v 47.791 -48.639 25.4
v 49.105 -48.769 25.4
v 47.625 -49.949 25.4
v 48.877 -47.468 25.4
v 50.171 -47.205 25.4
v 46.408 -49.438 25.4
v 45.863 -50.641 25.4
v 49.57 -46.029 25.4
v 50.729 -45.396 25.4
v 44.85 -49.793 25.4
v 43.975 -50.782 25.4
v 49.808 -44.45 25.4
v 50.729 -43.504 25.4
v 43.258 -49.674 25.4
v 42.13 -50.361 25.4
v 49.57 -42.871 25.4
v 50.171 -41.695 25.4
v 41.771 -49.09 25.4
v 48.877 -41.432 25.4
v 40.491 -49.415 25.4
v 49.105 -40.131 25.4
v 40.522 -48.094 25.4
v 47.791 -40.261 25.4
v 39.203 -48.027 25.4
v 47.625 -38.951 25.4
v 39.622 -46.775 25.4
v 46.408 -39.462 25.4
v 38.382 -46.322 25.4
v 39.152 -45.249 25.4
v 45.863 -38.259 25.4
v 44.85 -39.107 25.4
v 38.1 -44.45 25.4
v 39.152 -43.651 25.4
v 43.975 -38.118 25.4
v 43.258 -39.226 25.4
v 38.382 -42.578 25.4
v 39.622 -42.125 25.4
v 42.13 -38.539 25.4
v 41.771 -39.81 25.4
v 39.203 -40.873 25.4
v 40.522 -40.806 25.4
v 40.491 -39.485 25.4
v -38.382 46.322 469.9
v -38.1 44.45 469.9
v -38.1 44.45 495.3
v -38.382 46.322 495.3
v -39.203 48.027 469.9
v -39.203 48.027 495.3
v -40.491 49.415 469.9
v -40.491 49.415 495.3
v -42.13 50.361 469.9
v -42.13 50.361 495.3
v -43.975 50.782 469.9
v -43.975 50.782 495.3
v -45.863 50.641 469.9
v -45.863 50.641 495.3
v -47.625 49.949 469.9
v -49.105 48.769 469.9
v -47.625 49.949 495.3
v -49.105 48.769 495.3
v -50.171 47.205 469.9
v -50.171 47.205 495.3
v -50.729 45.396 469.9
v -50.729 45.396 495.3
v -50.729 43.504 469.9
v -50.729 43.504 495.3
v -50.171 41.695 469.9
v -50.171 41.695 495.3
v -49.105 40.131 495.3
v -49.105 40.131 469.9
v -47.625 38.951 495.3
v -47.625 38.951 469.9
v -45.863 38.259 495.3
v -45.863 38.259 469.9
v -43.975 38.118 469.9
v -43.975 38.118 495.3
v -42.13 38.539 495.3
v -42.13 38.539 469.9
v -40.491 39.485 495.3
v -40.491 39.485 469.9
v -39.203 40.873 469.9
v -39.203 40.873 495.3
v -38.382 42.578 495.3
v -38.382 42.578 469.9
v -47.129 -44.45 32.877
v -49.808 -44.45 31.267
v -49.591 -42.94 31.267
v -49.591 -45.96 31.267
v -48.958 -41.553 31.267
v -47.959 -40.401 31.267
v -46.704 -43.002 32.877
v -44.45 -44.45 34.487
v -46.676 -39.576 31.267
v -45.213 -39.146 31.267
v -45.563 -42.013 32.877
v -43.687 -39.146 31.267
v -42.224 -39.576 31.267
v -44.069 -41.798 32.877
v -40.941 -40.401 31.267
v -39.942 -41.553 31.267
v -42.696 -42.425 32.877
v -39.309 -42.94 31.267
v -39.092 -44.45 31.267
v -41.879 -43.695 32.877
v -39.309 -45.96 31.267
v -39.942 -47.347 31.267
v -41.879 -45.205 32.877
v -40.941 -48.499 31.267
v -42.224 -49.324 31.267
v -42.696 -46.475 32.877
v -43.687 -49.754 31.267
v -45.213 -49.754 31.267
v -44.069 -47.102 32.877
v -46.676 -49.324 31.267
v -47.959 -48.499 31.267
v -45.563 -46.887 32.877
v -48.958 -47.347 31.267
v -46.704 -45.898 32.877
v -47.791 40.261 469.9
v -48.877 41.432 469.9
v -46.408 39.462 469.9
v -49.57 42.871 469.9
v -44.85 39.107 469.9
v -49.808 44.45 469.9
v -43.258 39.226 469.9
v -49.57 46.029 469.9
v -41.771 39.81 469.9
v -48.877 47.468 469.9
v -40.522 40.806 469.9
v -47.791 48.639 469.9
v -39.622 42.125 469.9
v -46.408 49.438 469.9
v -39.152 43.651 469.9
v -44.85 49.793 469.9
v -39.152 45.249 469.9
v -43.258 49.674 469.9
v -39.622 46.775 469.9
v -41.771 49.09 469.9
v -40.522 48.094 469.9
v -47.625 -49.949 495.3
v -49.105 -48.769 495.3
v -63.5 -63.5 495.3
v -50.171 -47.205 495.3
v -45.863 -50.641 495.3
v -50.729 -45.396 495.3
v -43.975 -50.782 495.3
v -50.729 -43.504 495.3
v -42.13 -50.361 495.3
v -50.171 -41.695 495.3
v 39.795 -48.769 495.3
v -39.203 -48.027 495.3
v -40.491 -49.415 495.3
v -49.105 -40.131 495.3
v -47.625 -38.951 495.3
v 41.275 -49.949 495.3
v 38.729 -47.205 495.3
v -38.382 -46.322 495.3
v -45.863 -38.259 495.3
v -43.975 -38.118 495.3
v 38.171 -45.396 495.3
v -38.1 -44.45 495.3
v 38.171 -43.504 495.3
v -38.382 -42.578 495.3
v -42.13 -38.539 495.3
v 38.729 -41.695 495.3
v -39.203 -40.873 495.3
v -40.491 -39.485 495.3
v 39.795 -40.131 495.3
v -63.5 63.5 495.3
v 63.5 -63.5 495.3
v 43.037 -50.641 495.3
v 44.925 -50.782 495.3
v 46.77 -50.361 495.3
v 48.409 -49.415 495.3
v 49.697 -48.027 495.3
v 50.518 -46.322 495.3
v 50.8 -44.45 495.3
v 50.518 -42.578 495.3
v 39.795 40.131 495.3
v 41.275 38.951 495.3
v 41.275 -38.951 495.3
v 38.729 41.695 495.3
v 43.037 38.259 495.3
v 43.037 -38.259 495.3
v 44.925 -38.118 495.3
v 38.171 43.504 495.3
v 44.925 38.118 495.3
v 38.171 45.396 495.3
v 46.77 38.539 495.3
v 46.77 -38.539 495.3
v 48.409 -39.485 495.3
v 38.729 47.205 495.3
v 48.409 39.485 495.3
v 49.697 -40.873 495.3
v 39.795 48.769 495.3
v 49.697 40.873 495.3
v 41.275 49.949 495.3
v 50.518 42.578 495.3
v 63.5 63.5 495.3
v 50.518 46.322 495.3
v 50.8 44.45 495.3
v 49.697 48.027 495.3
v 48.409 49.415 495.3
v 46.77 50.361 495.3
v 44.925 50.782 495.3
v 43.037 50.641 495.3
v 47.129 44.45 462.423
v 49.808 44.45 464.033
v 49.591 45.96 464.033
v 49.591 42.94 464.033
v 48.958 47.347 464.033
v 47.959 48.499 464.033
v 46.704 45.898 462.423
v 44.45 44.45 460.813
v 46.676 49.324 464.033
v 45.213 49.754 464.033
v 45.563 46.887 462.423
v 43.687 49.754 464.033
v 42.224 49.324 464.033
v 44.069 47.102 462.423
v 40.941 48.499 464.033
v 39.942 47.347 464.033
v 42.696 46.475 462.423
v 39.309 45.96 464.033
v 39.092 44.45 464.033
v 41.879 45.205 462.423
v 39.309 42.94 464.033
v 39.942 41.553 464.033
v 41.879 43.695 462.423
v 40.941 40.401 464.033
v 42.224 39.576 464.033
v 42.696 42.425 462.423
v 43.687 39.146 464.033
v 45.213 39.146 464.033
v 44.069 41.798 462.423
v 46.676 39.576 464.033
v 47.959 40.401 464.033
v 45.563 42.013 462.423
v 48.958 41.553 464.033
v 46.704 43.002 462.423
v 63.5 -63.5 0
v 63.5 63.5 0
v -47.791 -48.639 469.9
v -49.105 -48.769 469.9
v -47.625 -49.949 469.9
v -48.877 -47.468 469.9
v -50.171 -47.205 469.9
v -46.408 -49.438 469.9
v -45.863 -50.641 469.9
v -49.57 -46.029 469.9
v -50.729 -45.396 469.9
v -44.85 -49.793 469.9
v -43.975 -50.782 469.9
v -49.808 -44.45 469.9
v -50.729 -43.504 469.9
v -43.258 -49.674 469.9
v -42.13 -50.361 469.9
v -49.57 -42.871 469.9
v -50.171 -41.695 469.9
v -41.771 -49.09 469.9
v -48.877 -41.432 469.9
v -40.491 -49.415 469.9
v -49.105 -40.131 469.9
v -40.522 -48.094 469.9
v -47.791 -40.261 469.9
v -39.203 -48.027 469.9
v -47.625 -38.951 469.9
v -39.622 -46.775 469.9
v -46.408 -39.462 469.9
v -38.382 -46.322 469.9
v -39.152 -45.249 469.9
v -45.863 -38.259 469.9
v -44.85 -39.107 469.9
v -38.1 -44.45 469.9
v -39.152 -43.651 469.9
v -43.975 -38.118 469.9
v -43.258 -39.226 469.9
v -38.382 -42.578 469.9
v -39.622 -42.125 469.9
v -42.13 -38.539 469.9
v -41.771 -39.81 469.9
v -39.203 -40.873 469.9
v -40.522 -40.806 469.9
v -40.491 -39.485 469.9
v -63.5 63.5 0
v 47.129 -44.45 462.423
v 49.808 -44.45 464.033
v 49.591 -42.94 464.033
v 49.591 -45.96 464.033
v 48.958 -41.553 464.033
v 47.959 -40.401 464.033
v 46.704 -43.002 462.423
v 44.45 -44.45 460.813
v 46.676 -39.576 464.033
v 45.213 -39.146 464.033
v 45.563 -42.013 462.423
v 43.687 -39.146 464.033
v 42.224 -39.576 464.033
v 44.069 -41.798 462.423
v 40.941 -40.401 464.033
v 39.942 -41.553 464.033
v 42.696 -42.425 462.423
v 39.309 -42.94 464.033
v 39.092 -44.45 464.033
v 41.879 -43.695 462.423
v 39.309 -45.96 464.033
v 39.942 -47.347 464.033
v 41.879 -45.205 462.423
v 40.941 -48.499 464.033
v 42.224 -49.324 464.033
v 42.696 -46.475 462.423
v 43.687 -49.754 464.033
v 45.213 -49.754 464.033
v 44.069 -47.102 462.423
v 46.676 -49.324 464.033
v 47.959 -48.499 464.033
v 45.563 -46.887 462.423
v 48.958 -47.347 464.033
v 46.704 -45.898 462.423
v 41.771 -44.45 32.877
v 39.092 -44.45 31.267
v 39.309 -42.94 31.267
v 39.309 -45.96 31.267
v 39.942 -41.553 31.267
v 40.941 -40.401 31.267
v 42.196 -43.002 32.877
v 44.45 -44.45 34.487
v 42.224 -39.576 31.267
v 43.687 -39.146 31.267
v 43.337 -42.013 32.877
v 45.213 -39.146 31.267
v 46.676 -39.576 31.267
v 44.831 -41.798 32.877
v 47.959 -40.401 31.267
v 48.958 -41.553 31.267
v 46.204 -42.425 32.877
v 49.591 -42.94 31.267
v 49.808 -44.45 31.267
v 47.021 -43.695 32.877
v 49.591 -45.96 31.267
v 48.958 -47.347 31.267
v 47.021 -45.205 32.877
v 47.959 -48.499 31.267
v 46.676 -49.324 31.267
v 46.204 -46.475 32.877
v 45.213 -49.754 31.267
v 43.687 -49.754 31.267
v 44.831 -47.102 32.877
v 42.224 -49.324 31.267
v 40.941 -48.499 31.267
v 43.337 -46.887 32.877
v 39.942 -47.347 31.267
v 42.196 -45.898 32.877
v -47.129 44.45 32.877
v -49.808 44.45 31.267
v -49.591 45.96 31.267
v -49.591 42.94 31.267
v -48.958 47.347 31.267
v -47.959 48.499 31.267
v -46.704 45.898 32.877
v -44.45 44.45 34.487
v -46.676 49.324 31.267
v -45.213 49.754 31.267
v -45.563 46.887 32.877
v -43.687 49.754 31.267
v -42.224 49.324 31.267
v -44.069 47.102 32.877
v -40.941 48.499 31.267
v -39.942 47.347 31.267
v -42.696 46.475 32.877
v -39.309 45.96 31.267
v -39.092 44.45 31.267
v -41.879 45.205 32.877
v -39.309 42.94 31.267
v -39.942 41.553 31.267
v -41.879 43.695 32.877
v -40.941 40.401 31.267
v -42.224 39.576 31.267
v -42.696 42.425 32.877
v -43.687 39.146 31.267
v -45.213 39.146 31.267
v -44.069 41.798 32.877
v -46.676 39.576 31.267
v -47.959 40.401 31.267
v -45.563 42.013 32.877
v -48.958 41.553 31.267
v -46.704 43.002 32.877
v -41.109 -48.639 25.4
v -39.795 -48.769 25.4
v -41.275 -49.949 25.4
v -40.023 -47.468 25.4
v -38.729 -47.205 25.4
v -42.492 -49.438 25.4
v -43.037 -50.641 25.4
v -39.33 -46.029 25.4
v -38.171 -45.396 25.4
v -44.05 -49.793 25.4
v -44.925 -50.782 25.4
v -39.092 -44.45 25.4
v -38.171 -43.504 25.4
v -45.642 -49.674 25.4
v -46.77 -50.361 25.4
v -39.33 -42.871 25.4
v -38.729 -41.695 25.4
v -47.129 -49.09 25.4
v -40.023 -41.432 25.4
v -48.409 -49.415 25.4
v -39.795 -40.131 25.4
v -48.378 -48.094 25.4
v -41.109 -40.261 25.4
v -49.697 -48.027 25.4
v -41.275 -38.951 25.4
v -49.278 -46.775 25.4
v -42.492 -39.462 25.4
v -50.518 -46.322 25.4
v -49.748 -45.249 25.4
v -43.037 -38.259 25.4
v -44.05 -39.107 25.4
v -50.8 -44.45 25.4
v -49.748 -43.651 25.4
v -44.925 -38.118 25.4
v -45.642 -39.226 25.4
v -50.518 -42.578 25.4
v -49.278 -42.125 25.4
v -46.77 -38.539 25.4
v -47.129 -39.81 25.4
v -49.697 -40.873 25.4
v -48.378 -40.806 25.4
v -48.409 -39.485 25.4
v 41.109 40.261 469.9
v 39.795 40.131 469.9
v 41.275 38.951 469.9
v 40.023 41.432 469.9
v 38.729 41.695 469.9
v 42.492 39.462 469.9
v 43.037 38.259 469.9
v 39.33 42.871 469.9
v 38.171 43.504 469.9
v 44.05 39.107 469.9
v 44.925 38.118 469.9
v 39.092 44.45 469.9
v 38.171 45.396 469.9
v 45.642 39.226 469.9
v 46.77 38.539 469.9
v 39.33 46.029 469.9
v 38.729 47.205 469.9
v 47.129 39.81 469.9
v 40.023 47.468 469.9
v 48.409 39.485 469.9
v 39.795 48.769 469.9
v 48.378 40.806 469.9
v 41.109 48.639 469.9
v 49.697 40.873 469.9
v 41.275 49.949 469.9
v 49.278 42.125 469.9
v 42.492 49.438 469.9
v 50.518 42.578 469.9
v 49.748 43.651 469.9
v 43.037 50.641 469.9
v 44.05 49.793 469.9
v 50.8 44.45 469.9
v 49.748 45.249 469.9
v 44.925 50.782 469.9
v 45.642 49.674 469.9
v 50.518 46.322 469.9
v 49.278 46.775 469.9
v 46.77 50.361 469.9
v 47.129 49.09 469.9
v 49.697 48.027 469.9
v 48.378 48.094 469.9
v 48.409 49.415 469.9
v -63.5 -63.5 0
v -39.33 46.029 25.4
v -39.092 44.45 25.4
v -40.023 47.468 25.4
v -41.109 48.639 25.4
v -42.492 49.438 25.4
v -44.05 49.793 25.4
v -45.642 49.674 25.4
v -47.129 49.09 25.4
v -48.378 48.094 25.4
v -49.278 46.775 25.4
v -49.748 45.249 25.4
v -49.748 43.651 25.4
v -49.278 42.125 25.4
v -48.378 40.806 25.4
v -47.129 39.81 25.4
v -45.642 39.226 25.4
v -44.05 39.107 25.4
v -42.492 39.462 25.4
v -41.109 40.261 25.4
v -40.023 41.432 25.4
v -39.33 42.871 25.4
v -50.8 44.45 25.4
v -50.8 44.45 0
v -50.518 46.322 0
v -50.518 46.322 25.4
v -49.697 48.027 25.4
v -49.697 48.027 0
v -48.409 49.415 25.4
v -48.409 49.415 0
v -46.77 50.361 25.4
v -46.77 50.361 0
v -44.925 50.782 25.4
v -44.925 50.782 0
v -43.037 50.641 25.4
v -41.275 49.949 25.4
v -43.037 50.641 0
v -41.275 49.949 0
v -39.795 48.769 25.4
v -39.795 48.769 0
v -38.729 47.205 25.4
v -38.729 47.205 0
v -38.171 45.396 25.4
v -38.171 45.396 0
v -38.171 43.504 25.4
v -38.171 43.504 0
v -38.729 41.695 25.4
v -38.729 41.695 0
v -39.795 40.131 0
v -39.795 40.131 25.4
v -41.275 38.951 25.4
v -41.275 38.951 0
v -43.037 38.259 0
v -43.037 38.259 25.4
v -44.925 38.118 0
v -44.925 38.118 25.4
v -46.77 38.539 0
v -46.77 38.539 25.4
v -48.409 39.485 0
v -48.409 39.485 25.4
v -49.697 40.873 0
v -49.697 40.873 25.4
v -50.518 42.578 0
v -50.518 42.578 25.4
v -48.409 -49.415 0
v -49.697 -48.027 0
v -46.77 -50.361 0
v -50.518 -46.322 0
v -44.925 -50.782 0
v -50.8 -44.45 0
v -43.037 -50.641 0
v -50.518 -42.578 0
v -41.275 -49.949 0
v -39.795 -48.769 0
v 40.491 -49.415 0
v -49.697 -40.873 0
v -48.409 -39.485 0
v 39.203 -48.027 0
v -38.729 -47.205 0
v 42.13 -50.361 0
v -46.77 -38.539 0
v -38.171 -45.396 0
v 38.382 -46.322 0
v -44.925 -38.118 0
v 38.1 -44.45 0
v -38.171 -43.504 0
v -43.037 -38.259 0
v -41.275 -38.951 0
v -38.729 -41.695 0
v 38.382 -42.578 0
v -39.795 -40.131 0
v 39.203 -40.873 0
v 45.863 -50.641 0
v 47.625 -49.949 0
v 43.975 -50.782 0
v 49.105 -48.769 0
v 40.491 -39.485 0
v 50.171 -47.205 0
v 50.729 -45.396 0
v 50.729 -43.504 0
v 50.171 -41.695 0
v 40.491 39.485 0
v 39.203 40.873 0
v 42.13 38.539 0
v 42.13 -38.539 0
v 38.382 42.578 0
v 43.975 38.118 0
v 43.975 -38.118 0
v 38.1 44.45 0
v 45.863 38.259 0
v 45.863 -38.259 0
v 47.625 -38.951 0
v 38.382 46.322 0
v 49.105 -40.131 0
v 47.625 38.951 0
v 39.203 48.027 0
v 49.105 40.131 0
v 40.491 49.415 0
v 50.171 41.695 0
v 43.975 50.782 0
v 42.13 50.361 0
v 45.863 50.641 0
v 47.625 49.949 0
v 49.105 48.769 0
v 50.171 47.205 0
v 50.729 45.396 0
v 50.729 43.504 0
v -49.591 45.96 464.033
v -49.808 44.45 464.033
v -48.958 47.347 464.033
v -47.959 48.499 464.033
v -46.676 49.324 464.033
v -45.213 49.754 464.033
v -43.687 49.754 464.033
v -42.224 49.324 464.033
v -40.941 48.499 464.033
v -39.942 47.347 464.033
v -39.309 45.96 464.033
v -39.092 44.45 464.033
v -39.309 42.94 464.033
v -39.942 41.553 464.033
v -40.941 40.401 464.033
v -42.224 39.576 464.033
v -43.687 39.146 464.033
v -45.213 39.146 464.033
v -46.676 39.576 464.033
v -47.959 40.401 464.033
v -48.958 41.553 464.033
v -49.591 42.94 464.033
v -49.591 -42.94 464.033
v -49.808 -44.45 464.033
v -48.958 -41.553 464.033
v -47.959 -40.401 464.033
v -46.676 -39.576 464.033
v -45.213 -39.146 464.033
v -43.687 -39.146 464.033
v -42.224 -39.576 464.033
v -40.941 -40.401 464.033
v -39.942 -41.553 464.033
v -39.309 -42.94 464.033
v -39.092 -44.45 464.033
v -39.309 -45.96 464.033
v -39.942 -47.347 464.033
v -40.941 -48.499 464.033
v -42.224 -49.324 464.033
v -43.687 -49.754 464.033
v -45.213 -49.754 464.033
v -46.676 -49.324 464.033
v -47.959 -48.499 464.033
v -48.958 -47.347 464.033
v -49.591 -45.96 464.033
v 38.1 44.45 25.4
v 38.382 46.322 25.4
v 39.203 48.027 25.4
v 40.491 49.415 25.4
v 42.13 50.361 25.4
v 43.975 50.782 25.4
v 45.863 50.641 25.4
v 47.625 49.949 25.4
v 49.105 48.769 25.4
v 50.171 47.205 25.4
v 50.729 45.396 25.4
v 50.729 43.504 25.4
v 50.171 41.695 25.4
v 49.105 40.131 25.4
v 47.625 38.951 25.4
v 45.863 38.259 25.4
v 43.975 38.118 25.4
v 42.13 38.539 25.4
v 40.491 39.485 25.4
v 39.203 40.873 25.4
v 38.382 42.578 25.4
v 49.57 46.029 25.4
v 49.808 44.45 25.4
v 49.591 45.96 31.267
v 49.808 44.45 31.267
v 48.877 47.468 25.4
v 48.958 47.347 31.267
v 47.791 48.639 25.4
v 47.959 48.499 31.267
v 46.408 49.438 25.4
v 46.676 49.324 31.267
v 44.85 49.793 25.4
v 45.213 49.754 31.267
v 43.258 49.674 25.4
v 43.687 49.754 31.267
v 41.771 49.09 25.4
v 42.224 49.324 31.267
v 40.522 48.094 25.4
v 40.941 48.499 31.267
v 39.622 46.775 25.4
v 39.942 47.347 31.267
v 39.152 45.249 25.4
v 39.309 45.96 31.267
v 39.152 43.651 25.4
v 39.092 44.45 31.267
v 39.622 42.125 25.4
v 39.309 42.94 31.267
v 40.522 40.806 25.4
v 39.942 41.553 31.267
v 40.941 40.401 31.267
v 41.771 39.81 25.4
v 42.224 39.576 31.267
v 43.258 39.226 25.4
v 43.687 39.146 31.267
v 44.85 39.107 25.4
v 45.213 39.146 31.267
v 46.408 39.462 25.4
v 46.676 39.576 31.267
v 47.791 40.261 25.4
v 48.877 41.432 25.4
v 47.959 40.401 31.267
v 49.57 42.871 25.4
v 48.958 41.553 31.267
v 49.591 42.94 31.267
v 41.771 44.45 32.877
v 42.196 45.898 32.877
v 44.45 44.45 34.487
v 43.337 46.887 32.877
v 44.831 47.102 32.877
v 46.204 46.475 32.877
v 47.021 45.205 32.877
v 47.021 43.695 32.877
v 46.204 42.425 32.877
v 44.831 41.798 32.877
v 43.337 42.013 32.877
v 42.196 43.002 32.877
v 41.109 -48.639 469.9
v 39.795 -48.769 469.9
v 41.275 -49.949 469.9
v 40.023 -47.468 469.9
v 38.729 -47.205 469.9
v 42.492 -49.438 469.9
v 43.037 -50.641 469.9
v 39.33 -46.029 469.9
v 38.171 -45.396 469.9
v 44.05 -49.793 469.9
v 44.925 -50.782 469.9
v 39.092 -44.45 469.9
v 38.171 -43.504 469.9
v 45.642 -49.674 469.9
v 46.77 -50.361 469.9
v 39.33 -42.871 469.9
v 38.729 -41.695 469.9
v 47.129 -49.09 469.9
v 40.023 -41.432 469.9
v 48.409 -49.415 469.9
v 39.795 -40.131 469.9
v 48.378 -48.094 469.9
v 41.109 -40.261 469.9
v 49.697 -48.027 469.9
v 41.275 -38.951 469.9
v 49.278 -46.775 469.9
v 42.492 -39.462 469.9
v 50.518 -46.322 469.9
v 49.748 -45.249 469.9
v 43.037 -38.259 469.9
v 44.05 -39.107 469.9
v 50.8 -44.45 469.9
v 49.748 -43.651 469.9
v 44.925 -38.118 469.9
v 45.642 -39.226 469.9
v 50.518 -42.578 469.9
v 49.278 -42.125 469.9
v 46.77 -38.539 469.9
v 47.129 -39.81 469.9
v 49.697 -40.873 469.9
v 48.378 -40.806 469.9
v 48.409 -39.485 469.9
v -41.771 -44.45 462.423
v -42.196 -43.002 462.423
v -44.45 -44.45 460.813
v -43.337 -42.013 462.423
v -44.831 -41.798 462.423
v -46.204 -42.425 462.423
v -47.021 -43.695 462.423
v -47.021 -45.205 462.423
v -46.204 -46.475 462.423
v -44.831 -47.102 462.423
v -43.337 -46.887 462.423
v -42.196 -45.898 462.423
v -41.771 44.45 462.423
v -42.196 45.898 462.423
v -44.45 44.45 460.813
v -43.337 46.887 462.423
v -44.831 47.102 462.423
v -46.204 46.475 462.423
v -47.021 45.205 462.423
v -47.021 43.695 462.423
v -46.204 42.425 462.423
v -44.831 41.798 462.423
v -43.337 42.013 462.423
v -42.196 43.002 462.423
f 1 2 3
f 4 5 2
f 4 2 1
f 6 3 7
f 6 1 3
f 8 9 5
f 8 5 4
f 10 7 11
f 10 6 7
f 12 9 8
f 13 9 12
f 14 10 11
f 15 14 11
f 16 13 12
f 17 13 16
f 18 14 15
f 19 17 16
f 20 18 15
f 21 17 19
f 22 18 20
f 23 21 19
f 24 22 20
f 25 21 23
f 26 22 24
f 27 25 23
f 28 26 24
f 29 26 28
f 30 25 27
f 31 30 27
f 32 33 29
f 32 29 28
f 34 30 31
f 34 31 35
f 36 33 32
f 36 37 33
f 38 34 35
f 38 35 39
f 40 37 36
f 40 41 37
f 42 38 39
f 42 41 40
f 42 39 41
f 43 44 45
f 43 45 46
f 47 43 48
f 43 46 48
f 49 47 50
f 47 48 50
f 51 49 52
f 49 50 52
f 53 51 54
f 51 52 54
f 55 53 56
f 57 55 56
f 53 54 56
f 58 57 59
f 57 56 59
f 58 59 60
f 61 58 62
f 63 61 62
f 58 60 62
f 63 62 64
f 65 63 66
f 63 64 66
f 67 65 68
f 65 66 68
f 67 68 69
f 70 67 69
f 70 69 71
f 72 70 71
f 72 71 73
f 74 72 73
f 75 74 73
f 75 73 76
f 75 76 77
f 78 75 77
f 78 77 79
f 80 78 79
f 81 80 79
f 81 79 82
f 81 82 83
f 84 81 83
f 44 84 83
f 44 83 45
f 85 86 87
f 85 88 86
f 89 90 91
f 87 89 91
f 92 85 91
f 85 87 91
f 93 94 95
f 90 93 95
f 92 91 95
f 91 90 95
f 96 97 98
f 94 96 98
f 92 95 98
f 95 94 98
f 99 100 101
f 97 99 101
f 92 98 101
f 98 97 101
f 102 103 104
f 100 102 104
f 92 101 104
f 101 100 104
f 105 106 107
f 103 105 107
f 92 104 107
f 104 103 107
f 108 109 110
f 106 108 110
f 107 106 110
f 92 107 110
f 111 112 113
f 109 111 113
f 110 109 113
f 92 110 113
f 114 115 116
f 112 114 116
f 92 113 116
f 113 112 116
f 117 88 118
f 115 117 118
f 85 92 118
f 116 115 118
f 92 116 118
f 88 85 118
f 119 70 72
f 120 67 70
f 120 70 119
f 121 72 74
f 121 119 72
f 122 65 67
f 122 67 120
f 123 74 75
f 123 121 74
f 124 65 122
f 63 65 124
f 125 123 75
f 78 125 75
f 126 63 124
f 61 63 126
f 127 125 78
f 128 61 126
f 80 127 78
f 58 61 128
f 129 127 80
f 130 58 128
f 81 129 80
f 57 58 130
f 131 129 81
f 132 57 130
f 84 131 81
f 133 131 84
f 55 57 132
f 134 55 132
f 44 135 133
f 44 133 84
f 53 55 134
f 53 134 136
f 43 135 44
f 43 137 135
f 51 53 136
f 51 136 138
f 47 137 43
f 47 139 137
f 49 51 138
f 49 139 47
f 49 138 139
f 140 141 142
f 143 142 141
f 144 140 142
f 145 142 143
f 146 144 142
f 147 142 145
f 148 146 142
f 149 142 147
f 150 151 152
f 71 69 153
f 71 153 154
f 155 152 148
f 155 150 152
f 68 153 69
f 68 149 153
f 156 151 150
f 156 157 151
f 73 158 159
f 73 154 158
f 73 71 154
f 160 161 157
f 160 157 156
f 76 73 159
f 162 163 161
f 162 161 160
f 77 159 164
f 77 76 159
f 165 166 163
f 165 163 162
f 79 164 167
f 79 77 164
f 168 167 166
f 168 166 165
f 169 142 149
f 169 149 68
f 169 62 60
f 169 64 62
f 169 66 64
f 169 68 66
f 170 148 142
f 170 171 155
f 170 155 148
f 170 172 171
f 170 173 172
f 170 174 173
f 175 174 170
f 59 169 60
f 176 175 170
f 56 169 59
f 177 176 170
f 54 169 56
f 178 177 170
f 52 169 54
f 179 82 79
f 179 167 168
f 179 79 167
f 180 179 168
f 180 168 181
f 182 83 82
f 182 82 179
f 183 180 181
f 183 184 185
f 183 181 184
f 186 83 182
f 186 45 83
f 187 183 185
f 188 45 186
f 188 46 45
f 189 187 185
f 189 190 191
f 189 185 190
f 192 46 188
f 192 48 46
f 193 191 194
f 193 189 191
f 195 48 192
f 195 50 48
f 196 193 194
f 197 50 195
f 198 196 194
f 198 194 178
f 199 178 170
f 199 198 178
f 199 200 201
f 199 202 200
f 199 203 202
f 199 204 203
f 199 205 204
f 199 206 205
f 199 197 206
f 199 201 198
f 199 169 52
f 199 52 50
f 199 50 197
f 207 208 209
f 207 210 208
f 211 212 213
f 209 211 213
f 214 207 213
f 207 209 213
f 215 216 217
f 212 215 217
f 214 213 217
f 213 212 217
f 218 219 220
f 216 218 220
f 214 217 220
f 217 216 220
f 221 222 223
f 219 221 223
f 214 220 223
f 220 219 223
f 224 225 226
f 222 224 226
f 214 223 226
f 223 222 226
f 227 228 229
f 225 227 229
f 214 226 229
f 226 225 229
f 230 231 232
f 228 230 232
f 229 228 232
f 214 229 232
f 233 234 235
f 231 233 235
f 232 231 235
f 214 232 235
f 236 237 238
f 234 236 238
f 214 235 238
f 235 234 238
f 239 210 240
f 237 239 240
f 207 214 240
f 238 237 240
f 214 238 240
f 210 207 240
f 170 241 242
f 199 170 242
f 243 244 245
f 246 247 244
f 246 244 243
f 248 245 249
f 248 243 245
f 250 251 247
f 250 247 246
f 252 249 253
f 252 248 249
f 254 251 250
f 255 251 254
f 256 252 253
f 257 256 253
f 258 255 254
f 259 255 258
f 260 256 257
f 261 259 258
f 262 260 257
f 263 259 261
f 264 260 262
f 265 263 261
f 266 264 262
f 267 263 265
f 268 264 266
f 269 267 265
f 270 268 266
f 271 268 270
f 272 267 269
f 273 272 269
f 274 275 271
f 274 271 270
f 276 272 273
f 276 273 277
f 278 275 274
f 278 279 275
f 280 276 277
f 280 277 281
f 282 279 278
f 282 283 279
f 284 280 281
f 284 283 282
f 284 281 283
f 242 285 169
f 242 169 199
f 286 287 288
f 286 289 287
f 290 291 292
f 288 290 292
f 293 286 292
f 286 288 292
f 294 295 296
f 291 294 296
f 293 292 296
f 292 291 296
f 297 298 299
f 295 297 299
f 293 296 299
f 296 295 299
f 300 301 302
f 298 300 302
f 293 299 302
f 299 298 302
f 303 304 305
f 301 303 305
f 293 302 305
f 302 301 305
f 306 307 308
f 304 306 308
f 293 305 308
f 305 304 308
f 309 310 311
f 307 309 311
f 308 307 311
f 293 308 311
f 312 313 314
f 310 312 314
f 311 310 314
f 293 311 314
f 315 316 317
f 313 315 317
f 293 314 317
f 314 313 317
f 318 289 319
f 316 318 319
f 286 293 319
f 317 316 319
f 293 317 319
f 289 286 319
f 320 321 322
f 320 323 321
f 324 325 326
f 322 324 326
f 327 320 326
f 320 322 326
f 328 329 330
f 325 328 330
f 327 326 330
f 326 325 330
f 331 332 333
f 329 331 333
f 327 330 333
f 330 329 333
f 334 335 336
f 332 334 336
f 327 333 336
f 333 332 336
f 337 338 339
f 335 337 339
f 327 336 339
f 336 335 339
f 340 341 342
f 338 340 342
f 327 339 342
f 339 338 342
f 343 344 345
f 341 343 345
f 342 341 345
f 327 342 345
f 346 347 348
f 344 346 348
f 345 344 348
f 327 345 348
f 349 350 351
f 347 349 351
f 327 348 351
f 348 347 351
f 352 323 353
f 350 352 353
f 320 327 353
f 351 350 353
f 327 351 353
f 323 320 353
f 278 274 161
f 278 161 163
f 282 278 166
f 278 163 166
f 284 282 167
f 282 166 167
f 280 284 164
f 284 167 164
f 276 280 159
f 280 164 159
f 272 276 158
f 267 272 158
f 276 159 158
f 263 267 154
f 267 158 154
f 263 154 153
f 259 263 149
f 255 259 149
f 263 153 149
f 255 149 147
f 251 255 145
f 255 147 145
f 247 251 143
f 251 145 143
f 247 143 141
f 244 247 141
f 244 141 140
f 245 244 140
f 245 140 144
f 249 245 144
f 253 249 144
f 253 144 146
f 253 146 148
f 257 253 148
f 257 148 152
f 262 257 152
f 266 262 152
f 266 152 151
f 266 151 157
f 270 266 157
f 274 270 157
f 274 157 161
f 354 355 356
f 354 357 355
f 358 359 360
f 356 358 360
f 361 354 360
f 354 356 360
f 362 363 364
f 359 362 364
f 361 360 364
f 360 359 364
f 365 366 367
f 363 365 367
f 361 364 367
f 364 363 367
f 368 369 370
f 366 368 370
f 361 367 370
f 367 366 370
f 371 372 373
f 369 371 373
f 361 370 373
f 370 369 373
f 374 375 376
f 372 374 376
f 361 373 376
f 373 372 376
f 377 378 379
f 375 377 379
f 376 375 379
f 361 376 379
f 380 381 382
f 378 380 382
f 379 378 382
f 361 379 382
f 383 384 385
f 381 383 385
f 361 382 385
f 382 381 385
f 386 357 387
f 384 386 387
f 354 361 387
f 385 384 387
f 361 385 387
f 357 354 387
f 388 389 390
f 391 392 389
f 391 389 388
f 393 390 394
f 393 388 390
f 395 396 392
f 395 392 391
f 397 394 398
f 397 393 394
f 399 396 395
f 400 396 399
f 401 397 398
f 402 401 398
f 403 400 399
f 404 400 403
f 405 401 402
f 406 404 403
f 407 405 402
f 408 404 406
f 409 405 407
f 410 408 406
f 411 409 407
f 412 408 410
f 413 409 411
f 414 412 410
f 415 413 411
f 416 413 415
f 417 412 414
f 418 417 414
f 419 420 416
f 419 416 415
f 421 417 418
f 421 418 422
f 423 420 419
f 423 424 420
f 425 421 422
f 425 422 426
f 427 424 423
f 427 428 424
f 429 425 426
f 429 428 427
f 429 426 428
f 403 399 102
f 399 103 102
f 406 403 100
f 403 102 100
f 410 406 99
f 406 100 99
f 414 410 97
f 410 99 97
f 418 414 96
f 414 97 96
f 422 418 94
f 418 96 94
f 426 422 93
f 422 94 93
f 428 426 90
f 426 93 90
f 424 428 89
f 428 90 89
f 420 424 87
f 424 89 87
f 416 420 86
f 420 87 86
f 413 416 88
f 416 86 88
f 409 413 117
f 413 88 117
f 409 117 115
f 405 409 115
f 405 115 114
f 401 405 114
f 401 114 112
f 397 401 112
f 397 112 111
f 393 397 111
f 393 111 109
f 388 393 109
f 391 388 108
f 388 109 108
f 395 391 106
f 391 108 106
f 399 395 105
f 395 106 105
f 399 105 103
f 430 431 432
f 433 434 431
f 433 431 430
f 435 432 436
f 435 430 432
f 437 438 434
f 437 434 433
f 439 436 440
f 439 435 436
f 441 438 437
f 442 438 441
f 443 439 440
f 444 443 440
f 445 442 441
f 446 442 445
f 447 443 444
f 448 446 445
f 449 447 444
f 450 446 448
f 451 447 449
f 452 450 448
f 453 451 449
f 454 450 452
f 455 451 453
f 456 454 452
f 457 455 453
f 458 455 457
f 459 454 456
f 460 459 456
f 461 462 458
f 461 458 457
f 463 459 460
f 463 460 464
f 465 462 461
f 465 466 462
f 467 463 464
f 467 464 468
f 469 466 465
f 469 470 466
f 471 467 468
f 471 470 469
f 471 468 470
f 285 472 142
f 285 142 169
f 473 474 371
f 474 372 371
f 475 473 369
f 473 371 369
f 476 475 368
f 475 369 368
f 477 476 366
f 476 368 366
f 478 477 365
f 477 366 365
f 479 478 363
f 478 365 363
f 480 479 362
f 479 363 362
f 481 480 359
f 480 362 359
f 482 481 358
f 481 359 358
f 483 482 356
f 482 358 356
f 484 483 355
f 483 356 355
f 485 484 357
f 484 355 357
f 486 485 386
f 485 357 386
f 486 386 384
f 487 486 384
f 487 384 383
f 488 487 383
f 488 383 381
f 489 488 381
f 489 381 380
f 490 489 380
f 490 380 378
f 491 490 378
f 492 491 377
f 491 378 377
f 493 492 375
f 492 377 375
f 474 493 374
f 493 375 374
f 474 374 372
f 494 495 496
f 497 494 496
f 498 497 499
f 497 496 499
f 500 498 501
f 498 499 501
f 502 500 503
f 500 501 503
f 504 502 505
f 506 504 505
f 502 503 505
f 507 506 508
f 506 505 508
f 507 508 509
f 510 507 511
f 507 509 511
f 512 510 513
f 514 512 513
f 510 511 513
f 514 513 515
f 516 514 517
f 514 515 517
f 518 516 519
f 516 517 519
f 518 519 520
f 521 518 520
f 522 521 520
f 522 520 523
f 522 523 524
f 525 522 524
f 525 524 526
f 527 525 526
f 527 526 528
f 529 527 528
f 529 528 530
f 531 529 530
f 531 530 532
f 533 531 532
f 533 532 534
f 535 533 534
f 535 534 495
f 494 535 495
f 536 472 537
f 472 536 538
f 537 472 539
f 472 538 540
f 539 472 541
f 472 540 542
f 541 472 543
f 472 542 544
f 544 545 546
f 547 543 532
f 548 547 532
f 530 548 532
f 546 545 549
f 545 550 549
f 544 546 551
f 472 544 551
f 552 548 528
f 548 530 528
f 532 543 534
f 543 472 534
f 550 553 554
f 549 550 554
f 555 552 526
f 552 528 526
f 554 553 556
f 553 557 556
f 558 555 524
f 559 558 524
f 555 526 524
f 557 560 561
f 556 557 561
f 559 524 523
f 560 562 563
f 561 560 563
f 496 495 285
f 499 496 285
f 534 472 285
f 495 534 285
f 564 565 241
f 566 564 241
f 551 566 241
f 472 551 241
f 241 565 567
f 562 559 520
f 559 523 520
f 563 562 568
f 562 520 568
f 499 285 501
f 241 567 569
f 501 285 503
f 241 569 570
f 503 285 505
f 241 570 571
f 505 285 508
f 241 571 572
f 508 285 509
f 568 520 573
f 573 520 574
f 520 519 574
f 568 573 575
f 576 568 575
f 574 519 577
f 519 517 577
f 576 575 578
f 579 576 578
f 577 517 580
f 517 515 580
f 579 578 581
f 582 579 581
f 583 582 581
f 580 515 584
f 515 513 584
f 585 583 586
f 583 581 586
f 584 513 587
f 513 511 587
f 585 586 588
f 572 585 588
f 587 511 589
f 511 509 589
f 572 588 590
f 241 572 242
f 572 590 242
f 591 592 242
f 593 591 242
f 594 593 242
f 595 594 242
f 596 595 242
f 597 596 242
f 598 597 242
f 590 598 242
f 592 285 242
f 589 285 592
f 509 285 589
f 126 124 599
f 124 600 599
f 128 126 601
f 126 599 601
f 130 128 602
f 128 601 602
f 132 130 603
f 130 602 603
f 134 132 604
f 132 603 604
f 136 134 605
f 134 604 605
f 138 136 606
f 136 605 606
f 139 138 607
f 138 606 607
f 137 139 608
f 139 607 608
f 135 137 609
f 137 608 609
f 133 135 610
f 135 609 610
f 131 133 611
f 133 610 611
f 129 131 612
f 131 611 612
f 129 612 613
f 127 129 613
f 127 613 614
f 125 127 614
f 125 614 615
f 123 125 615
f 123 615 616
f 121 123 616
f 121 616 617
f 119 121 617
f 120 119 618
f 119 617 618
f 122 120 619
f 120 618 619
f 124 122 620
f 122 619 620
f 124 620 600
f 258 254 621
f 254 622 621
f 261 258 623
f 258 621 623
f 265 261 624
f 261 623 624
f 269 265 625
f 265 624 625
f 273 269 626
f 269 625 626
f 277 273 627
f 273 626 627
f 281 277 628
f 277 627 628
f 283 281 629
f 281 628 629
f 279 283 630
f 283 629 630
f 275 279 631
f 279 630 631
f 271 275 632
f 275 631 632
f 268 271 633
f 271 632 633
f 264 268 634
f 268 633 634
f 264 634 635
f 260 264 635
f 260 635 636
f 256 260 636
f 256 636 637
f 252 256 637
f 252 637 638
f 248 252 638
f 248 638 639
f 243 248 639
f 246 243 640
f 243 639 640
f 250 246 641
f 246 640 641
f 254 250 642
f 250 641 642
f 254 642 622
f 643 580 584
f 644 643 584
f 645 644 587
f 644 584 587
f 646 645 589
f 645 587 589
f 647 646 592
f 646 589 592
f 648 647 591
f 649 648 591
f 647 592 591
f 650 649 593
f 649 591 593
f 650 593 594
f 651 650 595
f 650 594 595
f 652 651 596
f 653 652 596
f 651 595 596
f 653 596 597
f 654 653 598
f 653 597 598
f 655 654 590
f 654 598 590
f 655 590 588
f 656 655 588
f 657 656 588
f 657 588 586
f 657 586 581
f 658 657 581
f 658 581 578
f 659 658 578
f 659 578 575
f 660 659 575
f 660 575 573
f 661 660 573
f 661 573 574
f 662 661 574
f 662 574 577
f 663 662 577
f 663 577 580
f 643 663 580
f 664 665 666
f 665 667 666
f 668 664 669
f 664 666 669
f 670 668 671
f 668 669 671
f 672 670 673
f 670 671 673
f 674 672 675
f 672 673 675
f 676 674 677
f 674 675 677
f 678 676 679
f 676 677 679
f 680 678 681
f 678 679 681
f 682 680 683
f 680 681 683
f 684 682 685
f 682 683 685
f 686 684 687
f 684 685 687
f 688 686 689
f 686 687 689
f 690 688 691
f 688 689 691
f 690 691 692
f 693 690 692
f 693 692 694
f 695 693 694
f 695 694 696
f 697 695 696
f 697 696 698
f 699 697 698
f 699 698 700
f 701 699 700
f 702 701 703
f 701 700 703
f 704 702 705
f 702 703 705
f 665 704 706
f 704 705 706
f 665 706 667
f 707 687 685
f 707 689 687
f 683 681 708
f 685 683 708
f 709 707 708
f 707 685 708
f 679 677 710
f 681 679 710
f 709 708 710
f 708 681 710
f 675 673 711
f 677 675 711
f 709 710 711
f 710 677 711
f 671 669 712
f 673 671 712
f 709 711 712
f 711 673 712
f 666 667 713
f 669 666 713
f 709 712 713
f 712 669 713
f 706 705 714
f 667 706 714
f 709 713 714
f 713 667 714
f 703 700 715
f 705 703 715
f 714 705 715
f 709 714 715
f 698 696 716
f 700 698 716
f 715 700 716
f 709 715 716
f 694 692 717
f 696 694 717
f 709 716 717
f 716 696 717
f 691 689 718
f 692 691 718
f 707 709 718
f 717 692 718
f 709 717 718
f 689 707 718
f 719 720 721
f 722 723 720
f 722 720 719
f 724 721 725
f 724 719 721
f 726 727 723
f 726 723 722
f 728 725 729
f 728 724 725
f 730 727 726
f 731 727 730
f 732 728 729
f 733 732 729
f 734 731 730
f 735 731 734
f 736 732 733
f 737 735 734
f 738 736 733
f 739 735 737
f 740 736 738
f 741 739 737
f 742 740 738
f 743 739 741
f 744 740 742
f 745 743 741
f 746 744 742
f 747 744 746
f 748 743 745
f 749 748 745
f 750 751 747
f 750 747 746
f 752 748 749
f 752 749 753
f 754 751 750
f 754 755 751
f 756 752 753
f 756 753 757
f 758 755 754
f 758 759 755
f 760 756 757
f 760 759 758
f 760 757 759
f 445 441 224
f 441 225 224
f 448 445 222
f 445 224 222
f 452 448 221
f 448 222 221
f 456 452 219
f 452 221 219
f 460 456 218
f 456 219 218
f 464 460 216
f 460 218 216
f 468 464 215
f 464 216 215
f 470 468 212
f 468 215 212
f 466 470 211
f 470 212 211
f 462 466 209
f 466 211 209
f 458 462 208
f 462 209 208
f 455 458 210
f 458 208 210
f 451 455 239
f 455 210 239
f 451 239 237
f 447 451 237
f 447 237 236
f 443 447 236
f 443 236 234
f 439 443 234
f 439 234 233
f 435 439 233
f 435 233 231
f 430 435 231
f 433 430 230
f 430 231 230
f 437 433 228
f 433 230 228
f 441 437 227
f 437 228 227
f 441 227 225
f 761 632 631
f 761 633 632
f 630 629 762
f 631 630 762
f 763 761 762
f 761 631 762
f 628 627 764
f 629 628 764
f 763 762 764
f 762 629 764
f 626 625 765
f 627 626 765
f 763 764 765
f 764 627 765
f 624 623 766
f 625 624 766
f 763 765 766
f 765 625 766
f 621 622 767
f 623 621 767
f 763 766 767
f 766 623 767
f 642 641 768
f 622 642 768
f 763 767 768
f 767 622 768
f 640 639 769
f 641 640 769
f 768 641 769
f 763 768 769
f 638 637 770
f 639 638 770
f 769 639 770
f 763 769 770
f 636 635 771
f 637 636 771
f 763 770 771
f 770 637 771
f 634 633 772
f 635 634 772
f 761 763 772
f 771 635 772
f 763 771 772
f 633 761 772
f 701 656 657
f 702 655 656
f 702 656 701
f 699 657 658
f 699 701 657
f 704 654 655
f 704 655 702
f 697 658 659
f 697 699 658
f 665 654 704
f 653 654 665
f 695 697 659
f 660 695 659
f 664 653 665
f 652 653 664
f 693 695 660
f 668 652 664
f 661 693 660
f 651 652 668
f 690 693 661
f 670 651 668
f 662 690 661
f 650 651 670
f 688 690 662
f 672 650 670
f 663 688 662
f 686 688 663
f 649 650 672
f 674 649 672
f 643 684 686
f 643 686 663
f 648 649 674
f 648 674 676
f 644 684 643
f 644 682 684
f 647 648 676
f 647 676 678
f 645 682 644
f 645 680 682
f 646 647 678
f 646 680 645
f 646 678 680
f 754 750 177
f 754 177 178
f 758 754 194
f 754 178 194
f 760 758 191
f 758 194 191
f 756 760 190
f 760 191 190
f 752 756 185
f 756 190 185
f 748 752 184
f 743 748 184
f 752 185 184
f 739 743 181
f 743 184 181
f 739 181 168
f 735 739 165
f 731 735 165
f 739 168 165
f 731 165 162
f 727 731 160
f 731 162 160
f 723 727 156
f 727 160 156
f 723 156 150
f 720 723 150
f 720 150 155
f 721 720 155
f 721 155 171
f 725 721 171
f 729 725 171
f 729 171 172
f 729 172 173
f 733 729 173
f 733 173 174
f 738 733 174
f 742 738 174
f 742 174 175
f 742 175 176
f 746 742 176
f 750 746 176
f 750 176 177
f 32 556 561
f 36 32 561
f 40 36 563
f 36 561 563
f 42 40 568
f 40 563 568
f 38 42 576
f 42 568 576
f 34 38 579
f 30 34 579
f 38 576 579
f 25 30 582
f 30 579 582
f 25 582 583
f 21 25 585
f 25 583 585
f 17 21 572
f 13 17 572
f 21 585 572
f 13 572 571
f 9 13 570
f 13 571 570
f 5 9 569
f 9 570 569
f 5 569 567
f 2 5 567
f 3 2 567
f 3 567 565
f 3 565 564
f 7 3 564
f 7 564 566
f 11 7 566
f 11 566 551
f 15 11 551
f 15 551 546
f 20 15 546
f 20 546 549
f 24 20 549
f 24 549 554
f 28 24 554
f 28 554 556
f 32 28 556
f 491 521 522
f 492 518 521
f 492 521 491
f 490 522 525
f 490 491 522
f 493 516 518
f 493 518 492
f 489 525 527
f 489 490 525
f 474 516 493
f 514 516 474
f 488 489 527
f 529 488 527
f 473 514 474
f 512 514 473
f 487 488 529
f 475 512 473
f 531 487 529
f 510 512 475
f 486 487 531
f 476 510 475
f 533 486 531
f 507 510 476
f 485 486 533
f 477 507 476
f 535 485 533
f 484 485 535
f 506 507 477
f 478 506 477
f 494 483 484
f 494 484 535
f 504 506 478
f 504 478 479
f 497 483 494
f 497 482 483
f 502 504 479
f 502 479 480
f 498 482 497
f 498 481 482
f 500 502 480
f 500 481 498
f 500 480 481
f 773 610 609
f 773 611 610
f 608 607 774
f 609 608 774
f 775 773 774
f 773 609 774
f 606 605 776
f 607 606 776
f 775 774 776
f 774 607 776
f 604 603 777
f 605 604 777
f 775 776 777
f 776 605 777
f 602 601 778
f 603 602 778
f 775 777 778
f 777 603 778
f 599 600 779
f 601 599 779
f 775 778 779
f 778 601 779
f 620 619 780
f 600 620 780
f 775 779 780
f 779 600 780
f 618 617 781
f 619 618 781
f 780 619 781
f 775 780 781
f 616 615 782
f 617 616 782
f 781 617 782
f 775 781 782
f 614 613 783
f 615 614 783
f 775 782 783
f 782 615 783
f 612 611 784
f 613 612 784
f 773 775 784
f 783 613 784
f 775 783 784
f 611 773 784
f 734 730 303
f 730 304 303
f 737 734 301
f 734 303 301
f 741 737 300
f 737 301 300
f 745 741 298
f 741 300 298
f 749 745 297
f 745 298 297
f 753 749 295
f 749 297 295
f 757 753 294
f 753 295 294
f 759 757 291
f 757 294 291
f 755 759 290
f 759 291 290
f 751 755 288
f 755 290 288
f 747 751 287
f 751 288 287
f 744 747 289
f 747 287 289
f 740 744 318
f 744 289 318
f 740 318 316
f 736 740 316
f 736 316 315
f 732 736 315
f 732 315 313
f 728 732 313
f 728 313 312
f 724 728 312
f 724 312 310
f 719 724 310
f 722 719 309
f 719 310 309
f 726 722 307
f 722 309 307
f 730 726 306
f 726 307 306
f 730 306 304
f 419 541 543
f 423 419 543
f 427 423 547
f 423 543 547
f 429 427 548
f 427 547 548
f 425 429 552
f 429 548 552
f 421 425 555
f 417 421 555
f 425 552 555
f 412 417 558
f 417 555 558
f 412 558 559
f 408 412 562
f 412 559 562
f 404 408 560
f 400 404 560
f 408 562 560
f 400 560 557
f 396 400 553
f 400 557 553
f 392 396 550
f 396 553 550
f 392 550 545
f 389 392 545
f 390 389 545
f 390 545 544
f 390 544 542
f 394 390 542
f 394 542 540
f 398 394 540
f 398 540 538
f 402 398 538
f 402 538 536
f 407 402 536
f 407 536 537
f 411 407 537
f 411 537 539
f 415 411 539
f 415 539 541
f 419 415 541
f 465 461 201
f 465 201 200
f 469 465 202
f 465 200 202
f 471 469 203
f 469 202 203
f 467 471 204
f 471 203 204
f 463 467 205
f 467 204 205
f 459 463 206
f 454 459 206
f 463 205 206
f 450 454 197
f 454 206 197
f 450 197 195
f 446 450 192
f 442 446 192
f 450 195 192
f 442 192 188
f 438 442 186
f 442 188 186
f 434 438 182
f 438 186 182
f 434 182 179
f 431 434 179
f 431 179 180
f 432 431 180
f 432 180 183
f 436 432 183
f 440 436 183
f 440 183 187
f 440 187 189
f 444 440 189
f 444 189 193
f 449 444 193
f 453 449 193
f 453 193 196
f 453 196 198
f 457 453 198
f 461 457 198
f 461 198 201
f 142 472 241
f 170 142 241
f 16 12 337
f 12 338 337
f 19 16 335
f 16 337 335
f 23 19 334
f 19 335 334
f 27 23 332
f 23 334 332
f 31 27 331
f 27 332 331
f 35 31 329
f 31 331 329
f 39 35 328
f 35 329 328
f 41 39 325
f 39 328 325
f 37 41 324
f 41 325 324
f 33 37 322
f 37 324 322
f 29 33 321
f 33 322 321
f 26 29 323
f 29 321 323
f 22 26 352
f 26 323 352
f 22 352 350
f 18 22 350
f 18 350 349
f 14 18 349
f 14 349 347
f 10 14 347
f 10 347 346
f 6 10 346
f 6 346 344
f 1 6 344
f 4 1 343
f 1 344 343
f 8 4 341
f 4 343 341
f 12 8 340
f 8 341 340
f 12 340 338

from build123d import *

# Parameters (mm, degrees)
SKETCH1_W                         = 127
SKETCH1_H                         = 127
BOSS_EXTRUDE1_DEPTH               = 495.3
F_1_2_13_TAPPED_HOLE1_D           = 10.71626
F_1_2_13_TAPPED_HOLE1_DEPTH       = 31.2674
F_1_2_13_TAPPED_HOLE1_CBORE_D     = 12.7
F_1_2_13_TAPPED_HOLE1_CBORE_DEPTH = 25.4
F_1_2_13_TAPPED_HOLE1_TIP         = 3.219489309
F_1_2_13_TAPPED_HOLE2_D           = 10.71626
F_1_2_13_TAPPED_HOLE2_DEPTH       = 31.2674
F_1_2_13_TAPPED_HOLE2_CBORE_D     = 12.7
F_1_2_13_TAPPED_HOLE2_CBORE_DEPTH = 25.4
F_1_2_13_TAPPED_HOLE2_TIP         = 3.219489309


with BuildPart() as part:
    # Sketch1 → Boss-Extrude1 (new body)
    with BuildSketch(Plane.XY):
        Rectangle(SKETCH1_W, SKETCH1_H)
    extrude(amount=BOSS_EXTRUDE1_DEPTH)

    # 1/2-13 Tapped Hole1
    with Locations(Plane.XY.offset(495.3)):
        with Locations((44.45, 44.45), (44.45, -44.45), (-44.45, -44.45), (-44.45, 44.45)):
            CounterBoreHole(F_1_2_13_TAPPED_HOLE1_D / 2, F_1_2_13_TAPPED_HOLE1_CBORE_D / 2, F_1_2_13_TAPPED_HOLE1_CBORE_DEPTH, depth=F_1_2_13_TAPPED_HOLE1_DEPTH)
            with Locations((0, 0, -(F_1_2_13_TAPPED_HOLE1_DEPTH + F_1_2_13_TAPPED_HOLE1_TIP / 2))):  # 118° drill point
                Cone(0, F_1_2_13_TAPPED_HOLE1_D / 2, F_1_2_13_TAPPED_HOLE1_TIP, mode=Mode.SUBTRACT)

    # 1/2-13 Tapped Hole2
    with Locations(Plane(origin=(0, 0, 0), x_dir=(-1, 0, 0), z_dir=(0, 0, -1))):
        with Locations((-44.45, 44.45), (44.45, 44.45), (-44.45, -44.45), (44.45, -44.45)):
            CounterBoreHole(F_1_2_13_TAPPED_HOLE2_D / 2, F_1_2_13_TAPPED_HOLE2_CBORE_D / 2, F_1_2_13_TAPPED_HOLE2_CBORE_DEPTH, depth=F_1_2_13_TAPPED_HOLE2_DEPTH)
            with Locations((0, 0, -(F_1_2_13_TAPPED_HOLE2_DEPTH + F_1_2_13_TAPPED_HOLE2_TIP / 2))):  # 118° drill point
                Cone(0, F_1_2_13_TAPPED_HOLE2_D / 2, F_1_2_13_TAPPED_HOLE2_TIP, mode=Mode.SUBTRACT)


solid = part.part
